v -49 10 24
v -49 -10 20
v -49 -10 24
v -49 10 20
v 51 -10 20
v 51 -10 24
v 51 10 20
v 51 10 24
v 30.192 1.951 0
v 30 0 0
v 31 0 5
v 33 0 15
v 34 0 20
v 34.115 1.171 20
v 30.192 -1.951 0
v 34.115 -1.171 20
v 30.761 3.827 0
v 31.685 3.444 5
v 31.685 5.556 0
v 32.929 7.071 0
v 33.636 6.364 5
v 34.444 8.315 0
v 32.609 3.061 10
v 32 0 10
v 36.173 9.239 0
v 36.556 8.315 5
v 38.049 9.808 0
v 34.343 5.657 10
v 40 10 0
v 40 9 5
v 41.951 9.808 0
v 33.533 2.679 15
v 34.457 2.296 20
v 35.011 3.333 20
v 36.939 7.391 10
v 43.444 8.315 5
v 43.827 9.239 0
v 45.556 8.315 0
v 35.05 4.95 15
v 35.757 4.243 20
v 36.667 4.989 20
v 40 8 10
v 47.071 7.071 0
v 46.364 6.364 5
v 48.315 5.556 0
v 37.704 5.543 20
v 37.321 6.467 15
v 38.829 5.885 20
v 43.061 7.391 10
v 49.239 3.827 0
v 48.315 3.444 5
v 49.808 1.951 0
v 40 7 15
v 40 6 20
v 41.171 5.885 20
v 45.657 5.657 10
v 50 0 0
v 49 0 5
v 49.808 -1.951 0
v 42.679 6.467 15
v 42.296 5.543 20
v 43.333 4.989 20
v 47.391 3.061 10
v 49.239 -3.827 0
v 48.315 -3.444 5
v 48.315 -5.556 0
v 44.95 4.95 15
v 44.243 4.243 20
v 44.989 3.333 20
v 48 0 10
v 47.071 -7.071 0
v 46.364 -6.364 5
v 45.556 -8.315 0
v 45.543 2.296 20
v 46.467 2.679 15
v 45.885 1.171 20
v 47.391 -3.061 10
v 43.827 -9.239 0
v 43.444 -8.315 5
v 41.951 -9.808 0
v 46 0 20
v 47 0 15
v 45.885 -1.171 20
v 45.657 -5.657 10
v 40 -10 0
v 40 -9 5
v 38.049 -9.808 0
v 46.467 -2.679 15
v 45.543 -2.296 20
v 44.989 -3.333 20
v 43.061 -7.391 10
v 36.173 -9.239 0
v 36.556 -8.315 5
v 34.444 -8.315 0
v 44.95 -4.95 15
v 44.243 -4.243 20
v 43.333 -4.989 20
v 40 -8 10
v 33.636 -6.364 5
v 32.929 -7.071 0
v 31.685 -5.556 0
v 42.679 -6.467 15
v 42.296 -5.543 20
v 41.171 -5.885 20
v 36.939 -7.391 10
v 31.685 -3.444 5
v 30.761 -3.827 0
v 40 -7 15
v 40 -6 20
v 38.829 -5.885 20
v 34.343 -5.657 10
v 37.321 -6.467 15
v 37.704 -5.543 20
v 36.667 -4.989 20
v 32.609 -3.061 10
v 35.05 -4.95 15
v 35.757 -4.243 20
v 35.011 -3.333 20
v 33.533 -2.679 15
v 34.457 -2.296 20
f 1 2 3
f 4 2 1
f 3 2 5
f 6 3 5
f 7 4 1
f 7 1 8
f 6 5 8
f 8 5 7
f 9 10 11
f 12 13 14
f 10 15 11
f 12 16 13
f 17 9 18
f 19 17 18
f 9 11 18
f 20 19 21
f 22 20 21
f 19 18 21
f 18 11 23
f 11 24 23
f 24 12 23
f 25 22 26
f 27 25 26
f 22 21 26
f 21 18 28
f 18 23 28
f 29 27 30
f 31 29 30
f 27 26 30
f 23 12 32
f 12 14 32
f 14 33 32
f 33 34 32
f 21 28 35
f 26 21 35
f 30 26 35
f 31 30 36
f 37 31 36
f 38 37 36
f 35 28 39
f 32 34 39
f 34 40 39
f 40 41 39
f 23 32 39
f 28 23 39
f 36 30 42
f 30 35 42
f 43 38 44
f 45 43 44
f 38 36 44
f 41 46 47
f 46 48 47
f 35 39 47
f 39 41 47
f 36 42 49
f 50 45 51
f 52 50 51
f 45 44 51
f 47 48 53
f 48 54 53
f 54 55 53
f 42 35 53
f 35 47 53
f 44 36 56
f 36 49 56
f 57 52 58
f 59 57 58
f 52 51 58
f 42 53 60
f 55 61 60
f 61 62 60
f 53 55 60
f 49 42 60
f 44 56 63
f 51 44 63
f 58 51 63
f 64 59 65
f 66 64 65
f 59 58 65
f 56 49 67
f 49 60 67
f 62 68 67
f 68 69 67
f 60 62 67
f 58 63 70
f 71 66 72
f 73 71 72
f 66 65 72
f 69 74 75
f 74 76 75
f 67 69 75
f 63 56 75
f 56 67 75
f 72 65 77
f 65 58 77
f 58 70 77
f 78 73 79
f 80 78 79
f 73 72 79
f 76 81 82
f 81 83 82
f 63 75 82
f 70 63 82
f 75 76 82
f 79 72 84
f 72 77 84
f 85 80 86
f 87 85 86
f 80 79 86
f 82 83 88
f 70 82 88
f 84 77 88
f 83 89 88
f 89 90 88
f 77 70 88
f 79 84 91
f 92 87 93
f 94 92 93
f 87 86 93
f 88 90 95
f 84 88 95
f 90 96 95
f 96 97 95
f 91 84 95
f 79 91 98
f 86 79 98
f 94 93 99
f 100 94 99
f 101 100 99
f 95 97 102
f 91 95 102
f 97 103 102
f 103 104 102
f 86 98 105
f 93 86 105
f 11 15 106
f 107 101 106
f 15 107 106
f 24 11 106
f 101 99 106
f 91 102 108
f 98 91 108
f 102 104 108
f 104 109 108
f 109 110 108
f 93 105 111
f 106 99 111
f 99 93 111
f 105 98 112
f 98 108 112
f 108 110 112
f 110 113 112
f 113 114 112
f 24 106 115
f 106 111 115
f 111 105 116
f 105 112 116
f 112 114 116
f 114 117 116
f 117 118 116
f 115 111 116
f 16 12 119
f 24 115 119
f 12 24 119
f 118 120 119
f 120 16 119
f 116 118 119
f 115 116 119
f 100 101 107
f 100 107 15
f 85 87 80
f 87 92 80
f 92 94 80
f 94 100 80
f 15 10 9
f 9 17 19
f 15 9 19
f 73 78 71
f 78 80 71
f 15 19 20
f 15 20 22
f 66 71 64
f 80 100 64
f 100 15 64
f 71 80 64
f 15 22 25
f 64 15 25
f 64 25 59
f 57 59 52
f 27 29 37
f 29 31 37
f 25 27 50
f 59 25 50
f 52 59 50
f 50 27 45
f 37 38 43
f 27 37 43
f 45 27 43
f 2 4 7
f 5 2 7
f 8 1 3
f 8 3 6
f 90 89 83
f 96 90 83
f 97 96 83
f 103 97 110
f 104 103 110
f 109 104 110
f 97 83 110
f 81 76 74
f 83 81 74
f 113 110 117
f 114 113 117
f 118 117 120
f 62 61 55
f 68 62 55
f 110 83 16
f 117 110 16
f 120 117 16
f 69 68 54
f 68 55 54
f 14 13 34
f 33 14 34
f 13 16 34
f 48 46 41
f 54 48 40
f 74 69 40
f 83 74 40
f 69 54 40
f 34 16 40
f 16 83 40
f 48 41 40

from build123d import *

# Parameters (mm, degrees)
BOX_W     = 100
BOX_H     = 20
BOX_DEPTH = 4


with BuildPart() as c_ne:
    # Cone → Cone (revolve)
    with BuildSketch(Plane(origin=(-40, 0, 0), x_dir=(1, 0, 0), z_dir=(0, -1, 0))):
        Polygon((0, 0), (10, 0), (6, 20), (0, 20), align=None)
    revolve(axis=Axis((-40, 0, 0), (0, 0, 1)))


with BuildPart() as part_mirroring:
    # Part__Mirroring: instance of Cône
    add(c_ne.part.mirror(Plane(origin=(0, 0, 0), x_dir=(0, -1, 0), z_dir=(1, 0, 0))))


with BuildPart() as cube:
    # Box → Box (new body)
    with BuildSketch(Plane(origin=(-49, -10, 20), x_dir=(1, 0, 0), z_dir=(0, 0, 1))):
        with Locations((50, 10)):
            Rectangle(BOX_W, BOX_H)
    extrude(amount=BOX_DEPTH)


solid = Compound([part_mirroring.part, cube.part])
